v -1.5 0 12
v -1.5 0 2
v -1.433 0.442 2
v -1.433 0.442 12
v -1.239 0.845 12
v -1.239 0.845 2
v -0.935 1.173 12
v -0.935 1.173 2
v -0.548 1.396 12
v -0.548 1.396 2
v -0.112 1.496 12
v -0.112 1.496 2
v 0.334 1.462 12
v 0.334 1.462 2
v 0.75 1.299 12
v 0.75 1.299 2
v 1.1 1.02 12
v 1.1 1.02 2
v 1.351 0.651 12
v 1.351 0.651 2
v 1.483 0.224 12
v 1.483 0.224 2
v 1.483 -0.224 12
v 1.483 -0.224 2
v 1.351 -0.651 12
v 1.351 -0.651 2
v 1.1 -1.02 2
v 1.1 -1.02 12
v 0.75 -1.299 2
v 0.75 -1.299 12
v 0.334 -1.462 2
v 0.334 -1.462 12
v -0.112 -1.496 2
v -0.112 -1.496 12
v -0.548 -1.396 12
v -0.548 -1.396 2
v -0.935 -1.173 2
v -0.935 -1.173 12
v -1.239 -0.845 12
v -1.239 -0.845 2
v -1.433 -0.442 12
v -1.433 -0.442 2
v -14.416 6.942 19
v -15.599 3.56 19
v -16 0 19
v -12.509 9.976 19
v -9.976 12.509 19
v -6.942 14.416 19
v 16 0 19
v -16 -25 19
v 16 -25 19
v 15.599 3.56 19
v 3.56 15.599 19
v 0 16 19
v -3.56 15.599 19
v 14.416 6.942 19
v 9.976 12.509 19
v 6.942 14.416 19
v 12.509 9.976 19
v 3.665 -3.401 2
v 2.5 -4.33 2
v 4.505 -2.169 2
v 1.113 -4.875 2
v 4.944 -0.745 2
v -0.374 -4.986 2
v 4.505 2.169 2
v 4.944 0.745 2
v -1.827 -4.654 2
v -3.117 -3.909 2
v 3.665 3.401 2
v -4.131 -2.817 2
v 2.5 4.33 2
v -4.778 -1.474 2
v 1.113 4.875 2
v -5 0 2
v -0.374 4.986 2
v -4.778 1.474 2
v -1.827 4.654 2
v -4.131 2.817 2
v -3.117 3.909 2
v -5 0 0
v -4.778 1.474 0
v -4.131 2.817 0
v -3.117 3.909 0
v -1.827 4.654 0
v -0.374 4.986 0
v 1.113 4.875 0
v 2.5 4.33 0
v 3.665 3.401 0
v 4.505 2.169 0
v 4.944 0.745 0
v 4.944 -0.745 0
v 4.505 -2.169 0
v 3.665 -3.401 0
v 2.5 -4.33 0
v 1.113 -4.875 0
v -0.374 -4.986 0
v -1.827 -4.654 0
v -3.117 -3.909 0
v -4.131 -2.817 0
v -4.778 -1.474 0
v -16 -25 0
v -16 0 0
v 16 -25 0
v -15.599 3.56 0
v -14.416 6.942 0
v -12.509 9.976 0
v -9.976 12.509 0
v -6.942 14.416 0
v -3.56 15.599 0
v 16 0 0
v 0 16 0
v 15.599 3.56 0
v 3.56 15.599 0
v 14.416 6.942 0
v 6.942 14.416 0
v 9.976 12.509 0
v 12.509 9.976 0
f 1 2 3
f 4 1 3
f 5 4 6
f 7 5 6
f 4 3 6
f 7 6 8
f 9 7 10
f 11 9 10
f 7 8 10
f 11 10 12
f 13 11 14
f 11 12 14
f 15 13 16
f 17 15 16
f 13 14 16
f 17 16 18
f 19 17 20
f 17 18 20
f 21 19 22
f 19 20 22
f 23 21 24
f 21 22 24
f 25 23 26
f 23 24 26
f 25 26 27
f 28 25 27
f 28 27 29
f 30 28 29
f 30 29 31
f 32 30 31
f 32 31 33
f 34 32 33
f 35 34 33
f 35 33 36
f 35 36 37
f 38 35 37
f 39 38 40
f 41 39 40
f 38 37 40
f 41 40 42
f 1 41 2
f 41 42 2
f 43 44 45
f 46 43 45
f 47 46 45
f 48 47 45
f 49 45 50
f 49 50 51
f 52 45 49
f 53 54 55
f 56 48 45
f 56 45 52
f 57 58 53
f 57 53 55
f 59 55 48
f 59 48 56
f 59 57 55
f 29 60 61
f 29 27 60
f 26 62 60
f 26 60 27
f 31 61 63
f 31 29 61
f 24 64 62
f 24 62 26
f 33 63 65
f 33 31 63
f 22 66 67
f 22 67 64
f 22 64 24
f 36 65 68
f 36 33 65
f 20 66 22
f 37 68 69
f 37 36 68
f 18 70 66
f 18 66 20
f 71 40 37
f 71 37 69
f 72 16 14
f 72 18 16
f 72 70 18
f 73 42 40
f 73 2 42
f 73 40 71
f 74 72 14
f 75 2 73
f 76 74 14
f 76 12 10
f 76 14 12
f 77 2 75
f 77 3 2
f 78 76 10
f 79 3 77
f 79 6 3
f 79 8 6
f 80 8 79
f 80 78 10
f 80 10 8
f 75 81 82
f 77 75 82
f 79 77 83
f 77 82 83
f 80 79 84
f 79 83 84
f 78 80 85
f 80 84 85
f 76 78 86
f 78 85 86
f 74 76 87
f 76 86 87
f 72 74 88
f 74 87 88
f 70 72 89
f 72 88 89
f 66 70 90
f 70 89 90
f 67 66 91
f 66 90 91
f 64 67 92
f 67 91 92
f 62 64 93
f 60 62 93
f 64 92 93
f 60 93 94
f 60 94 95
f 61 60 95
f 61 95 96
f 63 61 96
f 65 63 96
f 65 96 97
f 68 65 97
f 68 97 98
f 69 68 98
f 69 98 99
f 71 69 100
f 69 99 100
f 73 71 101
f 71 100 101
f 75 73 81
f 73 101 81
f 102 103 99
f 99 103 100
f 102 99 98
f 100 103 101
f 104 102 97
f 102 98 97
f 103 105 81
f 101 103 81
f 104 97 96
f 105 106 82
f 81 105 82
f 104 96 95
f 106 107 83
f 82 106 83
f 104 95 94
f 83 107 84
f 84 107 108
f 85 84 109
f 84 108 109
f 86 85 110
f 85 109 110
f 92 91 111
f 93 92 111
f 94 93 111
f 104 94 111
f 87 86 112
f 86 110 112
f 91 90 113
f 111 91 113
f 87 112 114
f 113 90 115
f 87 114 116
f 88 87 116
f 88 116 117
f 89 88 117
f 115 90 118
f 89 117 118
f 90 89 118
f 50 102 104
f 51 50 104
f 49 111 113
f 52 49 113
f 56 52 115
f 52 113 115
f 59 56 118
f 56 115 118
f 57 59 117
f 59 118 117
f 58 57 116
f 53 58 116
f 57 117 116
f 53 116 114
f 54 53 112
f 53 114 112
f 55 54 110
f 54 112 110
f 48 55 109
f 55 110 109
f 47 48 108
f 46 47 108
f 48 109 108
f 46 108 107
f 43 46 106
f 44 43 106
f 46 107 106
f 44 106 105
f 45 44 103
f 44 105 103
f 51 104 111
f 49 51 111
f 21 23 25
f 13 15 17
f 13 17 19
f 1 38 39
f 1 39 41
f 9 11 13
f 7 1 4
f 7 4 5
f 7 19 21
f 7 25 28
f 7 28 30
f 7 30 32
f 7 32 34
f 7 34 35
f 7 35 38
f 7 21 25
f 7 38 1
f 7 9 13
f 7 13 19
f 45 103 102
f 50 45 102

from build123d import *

# Parameters (mm, degrees)
EXTRUDE_1_DEPTH     = 19
SKETCH_2_R          = 5
CUT_EXTRUDE_1_DEPTH = 2
SKETCH_3_R          = 1.5
CUT_EXTRUDE_2_DEPTH = 10


with BuildPart() as part:
    # 草圖1 → 填料-伸長1 (new body)
    with BuildSketch(Plane.XY):
        with BuildLine():
            Line((-16, 0), (-16, -25))
            Line((-16, -25), (16, -25))
            Line((16, -25), (16, 0))
            ThreePointArc((16, 0), (0, 16), (-16, 0))
        make_face()
    extrude(amount=EXTRUDE_1_DEPTH)

    # 草圖2 → 除料-伸長1 (cut)
    with BuildSketch(Plane(origin=(0, 0, 0), x_dir=(-1, 0, 0), z_dir=(0, 0, -1))):
        Circle(SKETCH_2_R)
    extrude(amount=-CUT_EXTRUDE_1_DEPTH, mode=Mode.SUBTRACT)

    # 草圖3 → 除料-伸長2 (cut)
    with BuildSketch(Plane(origin=(0, 0, 2), x_dir=(-1, 0, 0), z_dir=(0, 0, -1))):
        Circle(SKETCH_3_R)
    extrude(amount=-CUT_EXTRUDE_2_DEPTH, mode=Mode.SUBTRACT)


solid = part.part
